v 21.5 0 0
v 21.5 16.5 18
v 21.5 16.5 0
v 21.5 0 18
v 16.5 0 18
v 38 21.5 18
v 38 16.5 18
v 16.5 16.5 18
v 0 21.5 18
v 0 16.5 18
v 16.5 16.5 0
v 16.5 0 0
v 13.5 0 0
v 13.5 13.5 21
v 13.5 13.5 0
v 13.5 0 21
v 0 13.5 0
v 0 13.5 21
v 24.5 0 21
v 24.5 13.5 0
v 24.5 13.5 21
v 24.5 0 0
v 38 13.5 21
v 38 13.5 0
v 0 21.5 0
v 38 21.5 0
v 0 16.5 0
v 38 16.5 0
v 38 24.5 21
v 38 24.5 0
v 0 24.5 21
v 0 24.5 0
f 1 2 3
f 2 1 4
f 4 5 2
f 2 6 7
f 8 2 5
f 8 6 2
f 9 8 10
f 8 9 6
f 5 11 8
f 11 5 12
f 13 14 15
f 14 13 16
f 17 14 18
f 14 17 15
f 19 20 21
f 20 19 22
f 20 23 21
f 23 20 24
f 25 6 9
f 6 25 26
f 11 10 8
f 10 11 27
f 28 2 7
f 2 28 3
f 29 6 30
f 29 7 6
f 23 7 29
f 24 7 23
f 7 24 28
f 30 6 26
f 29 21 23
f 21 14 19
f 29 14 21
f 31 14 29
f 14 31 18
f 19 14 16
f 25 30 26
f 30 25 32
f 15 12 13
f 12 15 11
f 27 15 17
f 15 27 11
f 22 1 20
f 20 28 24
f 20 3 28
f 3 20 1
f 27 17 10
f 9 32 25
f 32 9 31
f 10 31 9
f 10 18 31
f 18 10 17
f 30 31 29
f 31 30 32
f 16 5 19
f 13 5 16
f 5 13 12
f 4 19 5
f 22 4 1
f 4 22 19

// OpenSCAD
/* "T" Panel connector generator by Llorenç Garcia 16/10/2024, https://github.com/Siot
 *
 * Licensing: 
 * This user content is licensed under a
Creative Commons Attribution-Noncommercial-Share Alike (https://creativecommons.org/licenses/by-nc-sa/4.0/)
*/

innerDuctWidth = 5;
outerArmLength = 13.5;
wallThickness = 3;
innerWallHeight = 18;

/* [Hidden] */
fullDuctLength = outerArmLength+wallThickness+innerDuctWidth + wallThickness + outerArmLength;
fullHeight = innerWallHeight + wallThickness; 

difference() {
    
    cube([fullDuctLength,fullDuctLength - outerArmLength, fullHeight]);

    union() {
            translate([outerArmLength+wallThickness, -1, -1]) {
            cube([innerDuctWidth,outerArmLength+wallThickness+2,innerWallHeight+1]);
        }
        
        translate([-1, -1, -1]) {
            cube([outerArmLength+1,outerArmLength+1,fullHeight+2]);
        }
        
        translate([fullDuctLength-outerArmLength, -1, -1]) {
            cube([outerArmLength+1,outerArmLength+1,fullHeight+2]);
        }
        
        
        translate([-1, outerArmLength + wallThickness, -1]) {
            cube([fullDuctLength+2,innerDuctWidth,innerWallHeight+1]);
        }
        
    }
    

}
